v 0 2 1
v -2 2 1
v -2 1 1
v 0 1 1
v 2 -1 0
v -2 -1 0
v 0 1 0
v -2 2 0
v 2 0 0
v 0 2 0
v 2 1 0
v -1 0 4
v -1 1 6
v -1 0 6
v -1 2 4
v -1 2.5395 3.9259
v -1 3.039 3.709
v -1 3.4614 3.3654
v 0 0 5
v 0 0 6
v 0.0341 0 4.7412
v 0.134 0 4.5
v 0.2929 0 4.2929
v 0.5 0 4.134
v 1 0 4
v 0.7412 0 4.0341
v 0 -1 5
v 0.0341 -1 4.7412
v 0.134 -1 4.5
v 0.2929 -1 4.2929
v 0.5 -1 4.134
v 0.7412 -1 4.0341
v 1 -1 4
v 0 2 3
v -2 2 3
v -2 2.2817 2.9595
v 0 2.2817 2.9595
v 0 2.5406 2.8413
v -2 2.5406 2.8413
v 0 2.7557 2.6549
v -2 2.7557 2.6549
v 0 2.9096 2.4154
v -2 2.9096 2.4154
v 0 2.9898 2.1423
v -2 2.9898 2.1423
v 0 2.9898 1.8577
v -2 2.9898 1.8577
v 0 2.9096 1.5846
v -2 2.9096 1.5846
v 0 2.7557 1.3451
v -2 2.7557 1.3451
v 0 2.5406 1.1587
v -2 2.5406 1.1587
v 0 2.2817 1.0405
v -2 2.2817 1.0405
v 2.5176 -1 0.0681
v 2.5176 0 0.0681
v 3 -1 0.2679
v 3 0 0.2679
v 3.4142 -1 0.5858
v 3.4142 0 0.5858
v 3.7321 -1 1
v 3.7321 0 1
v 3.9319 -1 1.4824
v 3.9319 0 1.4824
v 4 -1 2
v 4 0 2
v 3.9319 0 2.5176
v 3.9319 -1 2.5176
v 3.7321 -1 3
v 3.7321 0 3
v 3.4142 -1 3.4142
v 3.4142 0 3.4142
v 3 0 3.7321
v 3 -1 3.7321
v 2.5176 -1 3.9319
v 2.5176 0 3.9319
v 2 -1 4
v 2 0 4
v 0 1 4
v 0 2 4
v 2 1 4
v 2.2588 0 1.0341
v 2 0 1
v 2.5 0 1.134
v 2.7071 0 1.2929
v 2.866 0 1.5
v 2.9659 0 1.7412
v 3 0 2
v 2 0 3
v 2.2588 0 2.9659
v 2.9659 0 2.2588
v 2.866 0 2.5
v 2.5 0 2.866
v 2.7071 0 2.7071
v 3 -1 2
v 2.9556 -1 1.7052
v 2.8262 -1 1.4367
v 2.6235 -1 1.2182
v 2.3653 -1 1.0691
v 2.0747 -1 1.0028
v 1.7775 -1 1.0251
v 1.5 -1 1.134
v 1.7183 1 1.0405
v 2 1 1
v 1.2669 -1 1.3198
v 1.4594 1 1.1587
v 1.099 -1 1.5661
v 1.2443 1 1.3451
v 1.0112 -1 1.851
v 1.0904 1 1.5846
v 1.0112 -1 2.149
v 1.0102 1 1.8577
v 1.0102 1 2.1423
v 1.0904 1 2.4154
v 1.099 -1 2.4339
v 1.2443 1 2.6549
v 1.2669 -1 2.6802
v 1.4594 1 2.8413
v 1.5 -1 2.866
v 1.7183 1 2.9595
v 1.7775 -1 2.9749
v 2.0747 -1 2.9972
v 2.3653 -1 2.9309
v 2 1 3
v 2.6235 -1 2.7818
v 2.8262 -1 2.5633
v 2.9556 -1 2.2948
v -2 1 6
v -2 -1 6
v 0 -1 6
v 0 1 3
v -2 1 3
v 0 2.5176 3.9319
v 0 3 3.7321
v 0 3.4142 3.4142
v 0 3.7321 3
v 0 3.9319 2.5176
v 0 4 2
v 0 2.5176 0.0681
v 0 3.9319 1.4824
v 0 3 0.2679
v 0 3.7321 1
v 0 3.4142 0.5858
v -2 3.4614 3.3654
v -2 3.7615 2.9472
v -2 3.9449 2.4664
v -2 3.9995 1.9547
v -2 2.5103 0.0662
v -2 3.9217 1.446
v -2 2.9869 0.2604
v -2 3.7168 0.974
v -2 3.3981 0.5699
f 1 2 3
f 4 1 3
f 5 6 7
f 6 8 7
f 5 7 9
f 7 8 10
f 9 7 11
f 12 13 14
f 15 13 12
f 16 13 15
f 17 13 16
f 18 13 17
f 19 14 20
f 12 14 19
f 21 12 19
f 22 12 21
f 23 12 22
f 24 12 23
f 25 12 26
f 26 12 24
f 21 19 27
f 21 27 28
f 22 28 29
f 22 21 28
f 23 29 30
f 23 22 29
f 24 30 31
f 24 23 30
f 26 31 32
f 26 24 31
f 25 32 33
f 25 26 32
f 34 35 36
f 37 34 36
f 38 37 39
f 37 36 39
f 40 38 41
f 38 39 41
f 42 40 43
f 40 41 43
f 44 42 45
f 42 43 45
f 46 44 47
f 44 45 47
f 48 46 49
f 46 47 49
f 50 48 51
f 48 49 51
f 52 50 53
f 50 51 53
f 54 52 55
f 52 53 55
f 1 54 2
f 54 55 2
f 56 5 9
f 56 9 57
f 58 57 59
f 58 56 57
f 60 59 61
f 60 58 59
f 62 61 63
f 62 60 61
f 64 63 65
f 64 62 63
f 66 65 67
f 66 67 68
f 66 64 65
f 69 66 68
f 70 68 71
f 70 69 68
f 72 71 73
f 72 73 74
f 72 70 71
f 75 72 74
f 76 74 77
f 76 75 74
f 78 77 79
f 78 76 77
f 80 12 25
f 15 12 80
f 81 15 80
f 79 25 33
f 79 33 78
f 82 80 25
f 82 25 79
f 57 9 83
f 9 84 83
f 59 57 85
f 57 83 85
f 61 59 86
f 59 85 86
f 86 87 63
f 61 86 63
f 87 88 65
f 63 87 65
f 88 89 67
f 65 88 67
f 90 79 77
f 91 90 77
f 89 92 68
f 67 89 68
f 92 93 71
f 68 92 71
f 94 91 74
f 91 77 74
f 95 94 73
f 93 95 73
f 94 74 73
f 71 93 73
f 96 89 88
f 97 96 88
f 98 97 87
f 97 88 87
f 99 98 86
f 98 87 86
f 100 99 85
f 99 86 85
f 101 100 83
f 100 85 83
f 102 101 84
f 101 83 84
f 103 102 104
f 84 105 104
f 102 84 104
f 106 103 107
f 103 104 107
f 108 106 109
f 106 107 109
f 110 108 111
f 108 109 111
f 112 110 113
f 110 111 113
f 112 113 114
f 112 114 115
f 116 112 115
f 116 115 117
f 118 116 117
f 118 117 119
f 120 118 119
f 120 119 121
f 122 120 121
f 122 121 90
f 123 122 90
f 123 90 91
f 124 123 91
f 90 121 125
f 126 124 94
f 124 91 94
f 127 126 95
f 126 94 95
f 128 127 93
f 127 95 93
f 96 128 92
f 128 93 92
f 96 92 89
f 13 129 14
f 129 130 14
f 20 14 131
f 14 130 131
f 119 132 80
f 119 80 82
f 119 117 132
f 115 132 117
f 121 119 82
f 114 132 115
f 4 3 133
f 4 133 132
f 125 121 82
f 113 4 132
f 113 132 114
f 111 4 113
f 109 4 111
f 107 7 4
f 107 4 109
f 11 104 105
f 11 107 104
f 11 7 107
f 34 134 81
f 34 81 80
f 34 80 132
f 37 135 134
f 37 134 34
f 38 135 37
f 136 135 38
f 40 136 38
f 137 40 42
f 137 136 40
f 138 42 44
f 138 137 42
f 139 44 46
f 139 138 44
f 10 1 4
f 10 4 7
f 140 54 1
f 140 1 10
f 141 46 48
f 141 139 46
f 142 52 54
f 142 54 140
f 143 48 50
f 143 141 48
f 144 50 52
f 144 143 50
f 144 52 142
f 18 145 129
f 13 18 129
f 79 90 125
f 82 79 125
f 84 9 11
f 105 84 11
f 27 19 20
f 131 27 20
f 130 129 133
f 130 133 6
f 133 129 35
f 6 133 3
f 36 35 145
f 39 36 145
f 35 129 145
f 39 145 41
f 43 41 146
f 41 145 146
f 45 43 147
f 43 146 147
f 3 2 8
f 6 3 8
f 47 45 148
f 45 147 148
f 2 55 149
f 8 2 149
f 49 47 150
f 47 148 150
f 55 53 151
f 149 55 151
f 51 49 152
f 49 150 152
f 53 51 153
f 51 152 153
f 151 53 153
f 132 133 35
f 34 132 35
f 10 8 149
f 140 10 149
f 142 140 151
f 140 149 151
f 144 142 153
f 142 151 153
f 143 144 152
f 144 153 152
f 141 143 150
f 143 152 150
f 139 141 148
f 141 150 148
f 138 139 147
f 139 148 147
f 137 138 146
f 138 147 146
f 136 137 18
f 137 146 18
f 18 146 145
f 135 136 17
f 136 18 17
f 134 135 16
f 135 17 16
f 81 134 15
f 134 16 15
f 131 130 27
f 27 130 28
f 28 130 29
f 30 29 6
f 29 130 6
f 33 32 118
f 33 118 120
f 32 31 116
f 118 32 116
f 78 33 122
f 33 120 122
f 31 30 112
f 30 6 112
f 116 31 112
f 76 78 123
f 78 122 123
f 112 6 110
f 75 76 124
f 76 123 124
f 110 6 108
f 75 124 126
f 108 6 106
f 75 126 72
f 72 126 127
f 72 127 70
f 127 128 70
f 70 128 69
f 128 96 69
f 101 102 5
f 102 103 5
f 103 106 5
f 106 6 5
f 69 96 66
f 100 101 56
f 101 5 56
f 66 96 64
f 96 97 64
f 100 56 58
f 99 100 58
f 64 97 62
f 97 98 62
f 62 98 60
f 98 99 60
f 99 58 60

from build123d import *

# Parameters (mm, degrees)
SKETCH1_W           = 4
SKETCH1_H           = 2
BOSS_EXTRUDE1_DEPTH = 4
BOSS_EXTRUDE2_DEPTH = 1
SKETCH3_R           = 1
CUT_EXTRUDE1_DEPTH  = 3
SKETCH4_W           = 2
SKETCH4_H           = 1
BOSS_EXTRUDE3_DEPTH = 2
SKETCH5_W           = 1
SKETCH5_H           = 2
BOSS_EXTRUDE4_DEPTH = 1
BOSS_EXTRUDE5_DEPTH = 1
BOSS_EXTRUDE6_DEPTH = 1


with BuildPart() as part:
    # Sketch1 → Boss-Extrude1 (new body)
    with BuildSketch(Plane.XY):
        Rectangle(SKETCH1_W, SKETCH1_H)
    extrude(amount=BOSS_EXTRUDE1_DEPTH)

    # Sketch2 → Boss-Extrude2 (add)
    with BuildSketch(Plane.XZ.offset(1)):
        with BuildLine():
            Line((2, 4), (2, 0))
            ThreePointArc((2, 0), (4, 2), (2, 4))
        make_face()
    extrude(amount=-BOSS_EXTRUDE2_DEPTH)

    # Sketch3 → Cut-Extrude1 (cut, through all)
    with BuildSketch(Plane(origin=(0, 1, 0), x_dir=(1, 0, 0), z_dir=(0, 1, 0))):
        with Locations((2, -2)):
            Circle(SKETCH3_R)
    extrude(amount=-CUT_EXTRUDE1_DEPTH, mode=Mode.SUBTRACT)

    # Sketch4 → Boss-Extrude3 (add)
    with BuildSketch(Plane.ZY.offset(2)):
        with Locations((5, -0.5)):
            Rectangle(SKETCH4_W, SKETCH4_H)
        with BuildLine():
            Line((0, 1), (0, 2))
            ThreePointArc((0, 2), (2, 4), (4, 2))
            Line((4, 2), (4, 1))
            Line((4, 1), (3, 1))
            Line((3, 1), (3, 2))
            ThreePointArc((3, 2), (2, 3), (1, 2))
            Line((1, 2), (1, 1))
            Line((1, 1), (0, 1))
        make_face()
    extrude(amount=-BOSS_EXTRUDE3_DEPTH)

    # Sketch5 → Boss-Extrude4 (add)
    with BuildSketch(Plane(origin=(0, 0, 0), x_dir=(1, 0, 0), z_dir=(0, 1, 0))):
        with Locations((-1.5, -5)):
            Rectangle(SKETCH5_W, SKETCH5_H)
    extrude(amount=BOSS_EXTRUDE4_DEPTH)

    # Sketch6 → Boss-Extrude5 (add)
    with BuildSketch(Plane.ZY.offset(2)):
        with BuildLine():
            Line((3.365358974, 3.461435894), (6, 1))
            Line((6, 1), (4, 1))
            Line((4, 1), (4, 2))
            ThreePointArc((4, 2), (3.834491475, 2.796643601), (3.365358974, 3.461435894))
        make_face()
    extrude(amount=-BOSS_EXTRUDE5_DEPTH)

    # Sketch7 → Boss-Extrude6 (add)
    with BuildSketch(Plane(origin=(0, 0, 0), x_dir=(1, 0, 0), z_dir=(0, 1, 0))):
        with BuildLine():
            Line((1, -4), (0, -4))
            Line((0, -4), (0, -5))
            ThreePointArc((0, -5), (0.292893219, -4.292893219), (1, -4))
        make_face()
    extrude(amount=-BOSS_EXTRUDE6_DEPTH)


solid = part.part
